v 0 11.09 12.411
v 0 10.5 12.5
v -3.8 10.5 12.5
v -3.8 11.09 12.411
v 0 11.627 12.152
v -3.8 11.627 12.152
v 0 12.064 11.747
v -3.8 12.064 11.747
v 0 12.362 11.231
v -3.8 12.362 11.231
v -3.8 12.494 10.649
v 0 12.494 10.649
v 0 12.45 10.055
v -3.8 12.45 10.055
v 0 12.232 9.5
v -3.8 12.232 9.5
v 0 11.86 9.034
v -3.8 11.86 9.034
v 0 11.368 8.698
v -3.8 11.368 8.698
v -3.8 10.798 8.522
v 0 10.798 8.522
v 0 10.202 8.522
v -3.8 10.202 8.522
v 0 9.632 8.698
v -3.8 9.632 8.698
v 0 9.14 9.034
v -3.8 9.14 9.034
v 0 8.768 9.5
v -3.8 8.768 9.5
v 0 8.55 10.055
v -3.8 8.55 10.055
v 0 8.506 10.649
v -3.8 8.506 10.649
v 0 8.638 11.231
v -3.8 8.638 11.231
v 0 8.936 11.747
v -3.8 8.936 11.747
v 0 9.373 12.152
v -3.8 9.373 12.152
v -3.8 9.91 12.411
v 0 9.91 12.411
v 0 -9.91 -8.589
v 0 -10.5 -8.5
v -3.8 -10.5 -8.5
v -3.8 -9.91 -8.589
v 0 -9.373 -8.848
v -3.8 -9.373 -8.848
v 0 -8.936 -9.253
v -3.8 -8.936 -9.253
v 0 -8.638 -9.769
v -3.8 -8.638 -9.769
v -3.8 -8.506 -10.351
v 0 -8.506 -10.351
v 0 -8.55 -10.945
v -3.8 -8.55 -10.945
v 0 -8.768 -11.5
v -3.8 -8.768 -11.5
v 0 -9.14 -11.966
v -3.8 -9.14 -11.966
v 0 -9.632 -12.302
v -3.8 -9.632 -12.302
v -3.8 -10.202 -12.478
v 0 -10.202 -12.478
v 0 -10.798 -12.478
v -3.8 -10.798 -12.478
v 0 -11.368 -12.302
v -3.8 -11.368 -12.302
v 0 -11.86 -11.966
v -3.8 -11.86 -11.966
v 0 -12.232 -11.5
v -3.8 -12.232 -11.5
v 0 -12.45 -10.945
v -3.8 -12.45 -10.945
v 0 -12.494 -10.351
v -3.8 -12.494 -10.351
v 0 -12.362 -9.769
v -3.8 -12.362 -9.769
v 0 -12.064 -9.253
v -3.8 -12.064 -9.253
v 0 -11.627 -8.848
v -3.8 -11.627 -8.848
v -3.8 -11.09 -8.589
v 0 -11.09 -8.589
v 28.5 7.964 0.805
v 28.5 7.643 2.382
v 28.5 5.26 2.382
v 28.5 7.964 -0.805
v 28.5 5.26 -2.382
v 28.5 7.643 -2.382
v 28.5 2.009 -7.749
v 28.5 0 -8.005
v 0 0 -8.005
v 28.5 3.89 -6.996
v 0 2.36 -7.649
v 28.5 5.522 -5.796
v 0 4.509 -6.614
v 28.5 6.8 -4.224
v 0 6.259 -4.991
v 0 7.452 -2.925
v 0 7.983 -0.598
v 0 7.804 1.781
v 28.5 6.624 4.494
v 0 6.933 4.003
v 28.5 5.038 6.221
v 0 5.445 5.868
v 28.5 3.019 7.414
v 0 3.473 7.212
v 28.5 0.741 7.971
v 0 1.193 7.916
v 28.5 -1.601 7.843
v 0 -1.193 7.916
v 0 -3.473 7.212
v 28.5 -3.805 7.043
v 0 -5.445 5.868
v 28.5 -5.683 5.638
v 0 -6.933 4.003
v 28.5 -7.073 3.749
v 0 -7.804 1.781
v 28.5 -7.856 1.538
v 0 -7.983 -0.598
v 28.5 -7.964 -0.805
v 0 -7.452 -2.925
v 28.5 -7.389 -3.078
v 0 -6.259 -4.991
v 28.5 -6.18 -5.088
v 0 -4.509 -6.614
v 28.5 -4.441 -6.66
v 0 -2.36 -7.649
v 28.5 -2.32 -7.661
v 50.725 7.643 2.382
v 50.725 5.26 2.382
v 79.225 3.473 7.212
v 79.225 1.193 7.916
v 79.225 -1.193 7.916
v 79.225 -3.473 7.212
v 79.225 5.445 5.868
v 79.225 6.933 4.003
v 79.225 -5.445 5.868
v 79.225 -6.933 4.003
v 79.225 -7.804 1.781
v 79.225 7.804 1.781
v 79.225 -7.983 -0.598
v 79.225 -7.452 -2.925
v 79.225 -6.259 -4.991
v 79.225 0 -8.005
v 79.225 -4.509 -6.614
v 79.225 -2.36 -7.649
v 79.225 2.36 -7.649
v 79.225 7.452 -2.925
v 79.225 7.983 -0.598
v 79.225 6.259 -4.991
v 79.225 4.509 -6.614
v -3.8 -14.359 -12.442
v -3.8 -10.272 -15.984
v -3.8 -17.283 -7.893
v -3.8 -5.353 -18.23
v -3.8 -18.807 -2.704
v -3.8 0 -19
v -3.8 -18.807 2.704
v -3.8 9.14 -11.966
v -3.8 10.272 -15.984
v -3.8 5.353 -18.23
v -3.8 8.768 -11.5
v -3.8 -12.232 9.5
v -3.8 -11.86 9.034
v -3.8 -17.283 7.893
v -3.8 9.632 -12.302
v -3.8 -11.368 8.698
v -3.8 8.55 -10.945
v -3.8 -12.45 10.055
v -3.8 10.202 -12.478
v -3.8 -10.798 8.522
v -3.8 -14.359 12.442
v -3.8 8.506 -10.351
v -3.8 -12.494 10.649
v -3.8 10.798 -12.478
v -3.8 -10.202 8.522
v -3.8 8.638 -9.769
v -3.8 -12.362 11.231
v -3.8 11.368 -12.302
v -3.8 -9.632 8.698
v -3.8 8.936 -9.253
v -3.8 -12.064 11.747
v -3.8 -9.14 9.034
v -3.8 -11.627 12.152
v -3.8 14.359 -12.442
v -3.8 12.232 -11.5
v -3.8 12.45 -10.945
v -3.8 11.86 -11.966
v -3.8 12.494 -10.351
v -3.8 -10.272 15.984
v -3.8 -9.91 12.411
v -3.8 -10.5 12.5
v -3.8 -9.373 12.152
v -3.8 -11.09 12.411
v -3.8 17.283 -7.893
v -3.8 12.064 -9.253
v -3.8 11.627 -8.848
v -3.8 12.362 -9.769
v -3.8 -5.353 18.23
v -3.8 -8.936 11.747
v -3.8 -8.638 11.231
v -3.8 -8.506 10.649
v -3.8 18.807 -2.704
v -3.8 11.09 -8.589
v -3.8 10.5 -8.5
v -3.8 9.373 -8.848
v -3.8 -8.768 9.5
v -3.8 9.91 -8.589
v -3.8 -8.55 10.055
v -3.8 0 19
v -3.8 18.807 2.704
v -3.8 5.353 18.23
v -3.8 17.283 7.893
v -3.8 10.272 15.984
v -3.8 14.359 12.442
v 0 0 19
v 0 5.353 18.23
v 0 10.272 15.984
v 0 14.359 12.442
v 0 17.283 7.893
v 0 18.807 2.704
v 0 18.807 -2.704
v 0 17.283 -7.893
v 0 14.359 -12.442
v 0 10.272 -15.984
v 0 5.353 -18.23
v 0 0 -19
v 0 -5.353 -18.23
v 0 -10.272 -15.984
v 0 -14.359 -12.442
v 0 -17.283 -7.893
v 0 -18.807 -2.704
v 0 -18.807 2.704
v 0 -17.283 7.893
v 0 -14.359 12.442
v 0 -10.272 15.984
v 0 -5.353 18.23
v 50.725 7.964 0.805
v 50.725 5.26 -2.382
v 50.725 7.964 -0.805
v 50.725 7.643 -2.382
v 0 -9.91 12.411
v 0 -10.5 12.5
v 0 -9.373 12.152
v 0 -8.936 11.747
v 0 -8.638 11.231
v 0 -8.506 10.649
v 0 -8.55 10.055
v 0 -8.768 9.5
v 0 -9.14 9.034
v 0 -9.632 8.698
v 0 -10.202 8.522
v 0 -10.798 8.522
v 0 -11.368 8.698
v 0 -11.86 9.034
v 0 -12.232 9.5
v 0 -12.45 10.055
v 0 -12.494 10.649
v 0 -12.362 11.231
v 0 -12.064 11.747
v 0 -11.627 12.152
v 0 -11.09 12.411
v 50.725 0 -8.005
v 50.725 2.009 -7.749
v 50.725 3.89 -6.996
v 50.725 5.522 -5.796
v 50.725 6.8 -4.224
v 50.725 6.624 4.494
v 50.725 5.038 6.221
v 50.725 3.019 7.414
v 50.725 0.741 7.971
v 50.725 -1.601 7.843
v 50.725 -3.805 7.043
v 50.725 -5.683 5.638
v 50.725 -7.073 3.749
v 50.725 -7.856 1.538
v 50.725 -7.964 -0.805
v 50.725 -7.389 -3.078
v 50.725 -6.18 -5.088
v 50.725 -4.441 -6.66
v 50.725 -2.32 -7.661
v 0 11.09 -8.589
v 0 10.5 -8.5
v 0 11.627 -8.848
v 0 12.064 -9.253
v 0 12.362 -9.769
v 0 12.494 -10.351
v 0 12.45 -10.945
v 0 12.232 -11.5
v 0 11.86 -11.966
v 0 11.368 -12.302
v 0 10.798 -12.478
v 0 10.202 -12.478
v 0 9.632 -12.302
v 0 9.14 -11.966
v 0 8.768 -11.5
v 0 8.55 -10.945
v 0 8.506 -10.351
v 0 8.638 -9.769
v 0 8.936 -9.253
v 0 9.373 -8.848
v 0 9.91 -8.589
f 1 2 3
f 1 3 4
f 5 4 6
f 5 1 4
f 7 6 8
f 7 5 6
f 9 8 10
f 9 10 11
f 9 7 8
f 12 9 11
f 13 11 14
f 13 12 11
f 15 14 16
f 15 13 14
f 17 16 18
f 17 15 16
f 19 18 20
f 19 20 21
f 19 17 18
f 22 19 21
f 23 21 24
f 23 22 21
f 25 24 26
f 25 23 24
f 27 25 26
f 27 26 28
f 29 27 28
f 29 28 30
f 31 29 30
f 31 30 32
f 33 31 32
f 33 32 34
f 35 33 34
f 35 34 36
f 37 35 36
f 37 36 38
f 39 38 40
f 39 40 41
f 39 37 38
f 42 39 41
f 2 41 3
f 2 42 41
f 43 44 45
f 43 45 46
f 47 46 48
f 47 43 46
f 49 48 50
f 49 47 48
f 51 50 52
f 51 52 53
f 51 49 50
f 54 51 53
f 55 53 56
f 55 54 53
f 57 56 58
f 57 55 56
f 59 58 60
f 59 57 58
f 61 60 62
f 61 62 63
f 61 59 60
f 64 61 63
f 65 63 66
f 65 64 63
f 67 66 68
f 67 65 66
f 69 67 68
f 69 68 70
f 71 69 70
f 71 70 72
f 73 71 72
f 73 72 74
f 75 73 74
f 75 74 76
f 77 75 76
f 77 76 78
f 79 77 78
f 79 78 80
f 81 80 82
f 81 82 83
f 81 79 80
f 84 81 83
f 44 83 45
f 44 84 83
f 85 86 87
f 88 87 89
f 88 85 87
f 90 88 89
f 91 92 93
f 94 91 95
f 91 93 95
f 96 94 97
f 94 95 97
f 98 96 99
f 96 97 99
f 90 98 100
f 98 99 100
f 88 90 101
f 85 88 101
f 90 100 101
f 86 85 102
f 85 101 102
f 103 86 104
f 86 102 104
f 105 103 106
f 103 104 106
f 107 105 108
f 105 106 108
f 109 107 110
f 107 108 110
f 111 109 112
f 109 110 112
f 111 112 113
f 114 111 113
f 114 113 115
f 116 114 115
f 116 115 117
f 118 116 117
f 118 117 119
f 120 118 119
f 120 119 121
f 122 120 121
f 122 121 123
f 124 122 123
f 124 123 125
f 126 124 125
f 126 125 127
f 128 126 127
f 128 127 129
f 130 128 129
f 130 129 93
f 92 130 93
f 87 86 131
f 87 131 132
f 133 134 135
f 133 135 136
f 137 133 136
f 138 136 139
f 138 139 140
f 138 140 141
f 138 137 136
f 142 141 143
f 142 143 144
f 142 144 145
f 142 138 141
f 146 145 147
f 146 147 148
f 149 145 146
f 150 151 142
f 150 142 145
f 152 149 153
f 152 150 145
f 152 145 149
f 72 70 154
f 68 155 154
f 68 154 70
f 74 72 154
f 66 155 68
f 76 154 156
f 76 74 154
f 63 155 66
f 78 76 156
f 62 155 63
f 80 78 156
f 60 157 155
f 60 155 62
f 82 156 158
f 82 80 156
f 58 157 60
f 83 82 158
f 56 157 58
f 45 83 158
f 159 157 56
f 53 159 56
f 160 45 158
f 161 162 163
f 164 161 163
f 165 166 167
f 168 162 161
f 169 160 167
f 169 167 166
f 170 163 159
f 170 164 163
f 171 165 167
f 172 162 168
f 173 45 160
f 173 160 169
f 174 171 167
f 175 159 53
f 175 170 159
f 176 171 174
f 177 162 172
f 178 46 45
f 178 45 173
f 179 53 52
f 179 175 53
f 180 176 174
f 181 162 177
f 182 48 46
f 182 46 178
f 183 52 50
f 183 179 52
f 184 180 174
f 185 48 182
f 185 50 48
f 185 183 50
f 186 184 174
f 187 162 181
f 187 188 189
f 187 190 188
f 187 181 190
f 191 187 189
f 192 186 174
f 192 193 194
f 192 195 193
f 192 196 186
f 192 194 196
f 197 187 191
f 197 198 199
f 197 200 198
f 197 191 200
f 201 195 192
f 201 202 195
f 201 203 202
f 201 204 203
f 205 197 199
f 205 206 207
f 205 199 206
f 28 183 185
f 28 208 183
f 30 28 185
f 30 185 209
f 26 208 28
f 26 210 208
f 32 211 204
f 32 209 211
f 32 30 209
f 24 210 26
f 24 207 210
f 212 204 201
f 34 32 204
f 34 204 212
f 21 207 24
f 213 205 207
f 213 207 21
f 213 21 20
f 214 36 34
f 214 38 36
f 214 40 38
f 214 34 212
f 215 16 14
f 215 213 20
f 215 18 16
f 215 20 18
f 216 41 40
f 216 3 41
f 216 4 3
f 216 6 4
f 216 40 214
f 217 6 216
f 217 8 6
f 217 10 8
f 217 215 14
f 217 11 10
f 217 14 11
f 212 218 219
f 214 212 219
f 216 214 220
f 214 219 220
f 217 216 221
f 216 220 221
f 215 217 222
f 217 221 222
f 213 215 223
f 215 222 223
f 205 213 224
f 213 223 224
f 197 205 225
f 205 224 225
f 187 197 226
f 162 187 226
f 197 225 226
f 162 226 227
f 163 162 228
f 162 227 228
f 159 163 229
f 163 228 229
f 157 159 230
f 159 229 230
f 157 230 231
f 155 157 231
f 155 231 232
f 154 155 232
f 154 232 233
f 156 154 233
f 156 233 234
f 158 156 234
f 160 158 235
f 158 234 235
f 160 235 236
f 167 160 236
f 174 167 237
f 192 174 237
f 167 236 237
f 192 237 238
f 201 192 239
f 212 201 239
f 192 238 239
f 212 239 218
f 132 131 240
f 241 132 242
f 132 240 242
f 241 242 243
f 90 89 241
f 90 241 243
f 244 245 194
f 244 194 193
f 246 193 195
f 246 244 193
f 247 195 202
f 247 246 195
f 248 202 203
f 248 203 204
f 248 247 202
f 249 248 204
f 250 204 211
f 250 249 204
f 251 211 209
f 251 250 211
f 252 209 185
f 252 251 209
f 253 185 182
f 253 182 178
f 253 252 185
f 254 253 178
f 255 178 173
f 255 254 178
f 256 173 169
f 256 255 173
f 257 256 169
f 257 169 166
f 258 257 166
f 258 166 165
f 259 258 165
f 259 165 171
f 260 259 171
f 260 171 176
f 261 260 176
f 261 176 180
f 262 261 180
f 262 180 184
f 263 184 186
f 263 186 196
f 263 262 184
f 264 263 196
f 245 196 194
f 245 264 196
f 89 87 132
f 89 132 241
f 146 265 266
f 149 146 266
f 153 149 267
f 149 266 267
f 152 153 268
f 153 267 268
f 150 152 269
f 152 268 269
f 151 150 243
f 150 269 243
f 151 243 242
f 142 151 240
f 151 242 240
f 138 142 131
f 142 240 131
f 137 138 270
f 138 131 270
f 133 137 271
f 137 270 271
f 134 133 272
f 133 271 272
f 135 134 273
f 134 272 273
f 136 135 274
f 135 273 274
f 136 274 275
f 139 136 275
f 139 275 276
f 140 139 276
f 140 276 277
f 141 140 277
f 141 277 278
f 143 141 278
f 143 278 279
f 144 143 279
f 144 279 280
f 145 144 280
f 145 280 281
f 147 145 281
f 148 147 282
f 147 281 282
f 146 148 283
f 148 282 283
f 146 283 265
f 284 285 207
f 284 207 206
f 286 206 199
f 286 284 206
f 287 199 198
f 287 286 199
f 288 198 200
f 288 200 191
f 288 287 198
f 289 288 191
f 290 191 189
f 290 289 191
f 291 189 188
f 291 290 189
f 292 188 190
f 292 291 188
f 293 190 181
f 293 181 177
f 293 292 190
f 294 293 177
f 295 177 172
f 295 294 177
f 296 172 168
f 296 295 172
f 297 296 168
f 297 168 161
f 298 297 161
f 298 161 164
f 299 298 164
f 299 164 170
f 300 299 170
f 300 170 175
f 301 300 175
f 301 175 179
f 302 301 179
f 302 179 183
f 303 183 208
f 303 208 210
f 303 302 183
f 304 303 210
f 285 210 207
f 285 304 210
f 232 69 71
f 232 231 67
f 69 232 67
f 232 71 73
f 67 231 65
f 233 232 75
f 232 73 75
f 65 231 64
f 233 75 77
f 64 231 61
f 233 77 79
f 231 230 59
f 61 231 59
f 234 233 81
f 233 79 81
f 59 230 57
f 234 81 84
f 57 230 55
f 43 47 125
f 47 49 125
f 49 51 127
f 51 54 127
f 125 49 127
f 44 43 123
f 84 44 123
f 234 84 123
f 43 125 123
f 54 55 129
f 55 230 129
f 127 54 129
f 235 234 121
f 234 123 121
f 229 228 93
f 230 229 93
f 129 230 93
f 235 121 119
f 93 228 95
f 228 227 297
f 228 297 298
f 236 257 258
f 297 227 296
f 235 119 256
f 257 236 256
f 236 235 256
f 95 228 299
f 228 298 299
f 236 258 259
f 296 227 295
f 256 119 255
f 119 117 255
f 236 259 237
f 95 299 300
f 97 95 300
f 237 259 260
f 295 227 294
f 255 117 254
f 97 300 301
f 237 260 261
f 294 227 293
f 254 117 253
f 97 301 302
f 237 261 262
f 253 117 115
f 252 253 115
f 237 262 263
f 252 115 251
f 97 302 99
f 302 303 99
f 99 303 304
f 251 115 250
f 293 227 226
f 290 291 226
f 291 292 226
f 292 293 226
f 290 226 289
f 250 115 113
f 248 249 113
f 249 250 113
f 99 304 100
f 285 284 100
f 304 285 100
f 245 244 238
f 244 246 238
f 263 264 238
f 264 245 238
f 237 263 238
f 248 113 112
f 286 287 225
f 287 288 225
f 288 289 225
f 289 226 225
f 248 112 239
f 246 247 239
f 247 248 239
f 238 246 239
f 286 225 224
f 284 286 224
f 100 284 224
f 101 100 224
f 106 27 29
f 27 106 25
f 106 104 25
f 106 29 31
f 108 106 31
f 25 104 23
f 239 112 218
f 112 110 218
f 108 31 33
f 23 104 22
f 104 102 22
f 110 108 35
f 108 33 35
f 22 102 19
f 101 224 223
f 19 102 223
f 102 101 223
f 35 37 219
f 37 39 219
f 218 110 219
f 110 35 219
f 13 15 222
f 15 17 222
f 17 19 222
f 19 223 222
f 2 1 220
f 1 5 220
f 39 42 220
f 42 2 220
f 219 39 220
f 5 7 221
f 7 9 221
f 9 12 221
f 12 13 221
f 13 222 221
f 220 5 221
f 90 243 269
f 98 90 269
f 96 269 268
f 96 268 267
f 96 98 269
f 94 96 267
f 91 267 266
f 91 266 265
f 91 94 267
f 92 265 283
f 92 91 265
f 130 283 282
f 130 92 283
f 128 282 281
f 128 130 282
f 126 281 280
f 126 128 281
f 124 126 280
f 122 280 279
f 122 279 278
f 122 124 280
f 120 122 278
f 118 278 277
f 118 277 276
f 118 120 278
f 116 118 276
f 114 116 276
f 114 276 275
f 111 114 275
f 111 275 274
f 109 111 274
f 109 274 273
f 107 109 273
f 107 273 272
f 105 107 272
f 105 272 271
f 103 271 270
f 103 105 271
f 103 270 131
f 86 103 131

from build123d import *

# Parameters (mm, degrees)
SKETCH1_R           = 8.005
BOSS_EXTRUDE1_DEPTH = 28.5
SKETCH4_R           = 19
SKETCH4_R_2         = 2
BOSS_EXTRUDE3_DEPTH = 3.8
BOSS_EXTRUDE5_DEPTH = 22.225
SKETCH7_R           = 8.005
BOSS_EXTRUDE6_DEPTH = 28.5


with BuildPart() as part:
    # Sketch1 → Boss-Extrude1 (new body)
    with BuildSketch(Plane(origin=(0, 0, 0), x_dir=(0, 0, -1), z_dir=(1, 0, 0))):
        Circle(SKETCH1_R)
    extrude(amount=BOSS_EXTRUDE1_DEPTH)

    # Sketch4 → Boss-Extrude3 (add)
    with BuildSketch(Plane.ZY):
        Circle(SKETCH4_R)
        with Locations((-10.5, 10.5)):
            Circle(SKETCH4_R_2, mode=Mode.SUBTRACT)
        with Locations((10.5, 10.5)):
            Circle(SKETCH4_R_2, mode=Mode.SUBTRACT)
        with Locations((10.5, -10.5)):
            Circle(SKETCH4_R_2, mode=Mode.SUBTRACT)
        with Locations((-10.5, -10.5)):
            Circle(SKETCH4_R_2, mode=Mode.SUBTRACT)
    extrude(amount=BOSS_EXTRUDE3_DEPTH)

    # Sketch6 → Boss-Extrude5 (add)
    with BuildSketch(Plane(origin=(28.5, 0, 0), x_dir=(0, 0, -1), z_dir=(1, 0, 0))):
        with BuildLine():
            Line((-2.3815, 5.259544), (2.3815, 5.259544))
            Line((2.3815, 5.259544), (2.3815, 7.642544))
            ThreePointArc((2.3815, 7.642544), (0, -8.005), (-2.3815, 7.642544))
            Line((-2.3815, 7.642544), (-2.3815, 5.259544))
        make_face()
    extrude(amount=BOSS_EXTRUDE5_DEPTH)

    # Sketch7 → Boss-Extrude6 (add)
    with BuildSketch(Plane(origin=(50.725, 0, 0), x_dir=(0, 0, -1), z_dir=(1, 0, 0))):
        Circle(SKETCH7_R)
    extrude(amount=BOSS_EXTRUDE6_DEPTH)


solid = part.part
